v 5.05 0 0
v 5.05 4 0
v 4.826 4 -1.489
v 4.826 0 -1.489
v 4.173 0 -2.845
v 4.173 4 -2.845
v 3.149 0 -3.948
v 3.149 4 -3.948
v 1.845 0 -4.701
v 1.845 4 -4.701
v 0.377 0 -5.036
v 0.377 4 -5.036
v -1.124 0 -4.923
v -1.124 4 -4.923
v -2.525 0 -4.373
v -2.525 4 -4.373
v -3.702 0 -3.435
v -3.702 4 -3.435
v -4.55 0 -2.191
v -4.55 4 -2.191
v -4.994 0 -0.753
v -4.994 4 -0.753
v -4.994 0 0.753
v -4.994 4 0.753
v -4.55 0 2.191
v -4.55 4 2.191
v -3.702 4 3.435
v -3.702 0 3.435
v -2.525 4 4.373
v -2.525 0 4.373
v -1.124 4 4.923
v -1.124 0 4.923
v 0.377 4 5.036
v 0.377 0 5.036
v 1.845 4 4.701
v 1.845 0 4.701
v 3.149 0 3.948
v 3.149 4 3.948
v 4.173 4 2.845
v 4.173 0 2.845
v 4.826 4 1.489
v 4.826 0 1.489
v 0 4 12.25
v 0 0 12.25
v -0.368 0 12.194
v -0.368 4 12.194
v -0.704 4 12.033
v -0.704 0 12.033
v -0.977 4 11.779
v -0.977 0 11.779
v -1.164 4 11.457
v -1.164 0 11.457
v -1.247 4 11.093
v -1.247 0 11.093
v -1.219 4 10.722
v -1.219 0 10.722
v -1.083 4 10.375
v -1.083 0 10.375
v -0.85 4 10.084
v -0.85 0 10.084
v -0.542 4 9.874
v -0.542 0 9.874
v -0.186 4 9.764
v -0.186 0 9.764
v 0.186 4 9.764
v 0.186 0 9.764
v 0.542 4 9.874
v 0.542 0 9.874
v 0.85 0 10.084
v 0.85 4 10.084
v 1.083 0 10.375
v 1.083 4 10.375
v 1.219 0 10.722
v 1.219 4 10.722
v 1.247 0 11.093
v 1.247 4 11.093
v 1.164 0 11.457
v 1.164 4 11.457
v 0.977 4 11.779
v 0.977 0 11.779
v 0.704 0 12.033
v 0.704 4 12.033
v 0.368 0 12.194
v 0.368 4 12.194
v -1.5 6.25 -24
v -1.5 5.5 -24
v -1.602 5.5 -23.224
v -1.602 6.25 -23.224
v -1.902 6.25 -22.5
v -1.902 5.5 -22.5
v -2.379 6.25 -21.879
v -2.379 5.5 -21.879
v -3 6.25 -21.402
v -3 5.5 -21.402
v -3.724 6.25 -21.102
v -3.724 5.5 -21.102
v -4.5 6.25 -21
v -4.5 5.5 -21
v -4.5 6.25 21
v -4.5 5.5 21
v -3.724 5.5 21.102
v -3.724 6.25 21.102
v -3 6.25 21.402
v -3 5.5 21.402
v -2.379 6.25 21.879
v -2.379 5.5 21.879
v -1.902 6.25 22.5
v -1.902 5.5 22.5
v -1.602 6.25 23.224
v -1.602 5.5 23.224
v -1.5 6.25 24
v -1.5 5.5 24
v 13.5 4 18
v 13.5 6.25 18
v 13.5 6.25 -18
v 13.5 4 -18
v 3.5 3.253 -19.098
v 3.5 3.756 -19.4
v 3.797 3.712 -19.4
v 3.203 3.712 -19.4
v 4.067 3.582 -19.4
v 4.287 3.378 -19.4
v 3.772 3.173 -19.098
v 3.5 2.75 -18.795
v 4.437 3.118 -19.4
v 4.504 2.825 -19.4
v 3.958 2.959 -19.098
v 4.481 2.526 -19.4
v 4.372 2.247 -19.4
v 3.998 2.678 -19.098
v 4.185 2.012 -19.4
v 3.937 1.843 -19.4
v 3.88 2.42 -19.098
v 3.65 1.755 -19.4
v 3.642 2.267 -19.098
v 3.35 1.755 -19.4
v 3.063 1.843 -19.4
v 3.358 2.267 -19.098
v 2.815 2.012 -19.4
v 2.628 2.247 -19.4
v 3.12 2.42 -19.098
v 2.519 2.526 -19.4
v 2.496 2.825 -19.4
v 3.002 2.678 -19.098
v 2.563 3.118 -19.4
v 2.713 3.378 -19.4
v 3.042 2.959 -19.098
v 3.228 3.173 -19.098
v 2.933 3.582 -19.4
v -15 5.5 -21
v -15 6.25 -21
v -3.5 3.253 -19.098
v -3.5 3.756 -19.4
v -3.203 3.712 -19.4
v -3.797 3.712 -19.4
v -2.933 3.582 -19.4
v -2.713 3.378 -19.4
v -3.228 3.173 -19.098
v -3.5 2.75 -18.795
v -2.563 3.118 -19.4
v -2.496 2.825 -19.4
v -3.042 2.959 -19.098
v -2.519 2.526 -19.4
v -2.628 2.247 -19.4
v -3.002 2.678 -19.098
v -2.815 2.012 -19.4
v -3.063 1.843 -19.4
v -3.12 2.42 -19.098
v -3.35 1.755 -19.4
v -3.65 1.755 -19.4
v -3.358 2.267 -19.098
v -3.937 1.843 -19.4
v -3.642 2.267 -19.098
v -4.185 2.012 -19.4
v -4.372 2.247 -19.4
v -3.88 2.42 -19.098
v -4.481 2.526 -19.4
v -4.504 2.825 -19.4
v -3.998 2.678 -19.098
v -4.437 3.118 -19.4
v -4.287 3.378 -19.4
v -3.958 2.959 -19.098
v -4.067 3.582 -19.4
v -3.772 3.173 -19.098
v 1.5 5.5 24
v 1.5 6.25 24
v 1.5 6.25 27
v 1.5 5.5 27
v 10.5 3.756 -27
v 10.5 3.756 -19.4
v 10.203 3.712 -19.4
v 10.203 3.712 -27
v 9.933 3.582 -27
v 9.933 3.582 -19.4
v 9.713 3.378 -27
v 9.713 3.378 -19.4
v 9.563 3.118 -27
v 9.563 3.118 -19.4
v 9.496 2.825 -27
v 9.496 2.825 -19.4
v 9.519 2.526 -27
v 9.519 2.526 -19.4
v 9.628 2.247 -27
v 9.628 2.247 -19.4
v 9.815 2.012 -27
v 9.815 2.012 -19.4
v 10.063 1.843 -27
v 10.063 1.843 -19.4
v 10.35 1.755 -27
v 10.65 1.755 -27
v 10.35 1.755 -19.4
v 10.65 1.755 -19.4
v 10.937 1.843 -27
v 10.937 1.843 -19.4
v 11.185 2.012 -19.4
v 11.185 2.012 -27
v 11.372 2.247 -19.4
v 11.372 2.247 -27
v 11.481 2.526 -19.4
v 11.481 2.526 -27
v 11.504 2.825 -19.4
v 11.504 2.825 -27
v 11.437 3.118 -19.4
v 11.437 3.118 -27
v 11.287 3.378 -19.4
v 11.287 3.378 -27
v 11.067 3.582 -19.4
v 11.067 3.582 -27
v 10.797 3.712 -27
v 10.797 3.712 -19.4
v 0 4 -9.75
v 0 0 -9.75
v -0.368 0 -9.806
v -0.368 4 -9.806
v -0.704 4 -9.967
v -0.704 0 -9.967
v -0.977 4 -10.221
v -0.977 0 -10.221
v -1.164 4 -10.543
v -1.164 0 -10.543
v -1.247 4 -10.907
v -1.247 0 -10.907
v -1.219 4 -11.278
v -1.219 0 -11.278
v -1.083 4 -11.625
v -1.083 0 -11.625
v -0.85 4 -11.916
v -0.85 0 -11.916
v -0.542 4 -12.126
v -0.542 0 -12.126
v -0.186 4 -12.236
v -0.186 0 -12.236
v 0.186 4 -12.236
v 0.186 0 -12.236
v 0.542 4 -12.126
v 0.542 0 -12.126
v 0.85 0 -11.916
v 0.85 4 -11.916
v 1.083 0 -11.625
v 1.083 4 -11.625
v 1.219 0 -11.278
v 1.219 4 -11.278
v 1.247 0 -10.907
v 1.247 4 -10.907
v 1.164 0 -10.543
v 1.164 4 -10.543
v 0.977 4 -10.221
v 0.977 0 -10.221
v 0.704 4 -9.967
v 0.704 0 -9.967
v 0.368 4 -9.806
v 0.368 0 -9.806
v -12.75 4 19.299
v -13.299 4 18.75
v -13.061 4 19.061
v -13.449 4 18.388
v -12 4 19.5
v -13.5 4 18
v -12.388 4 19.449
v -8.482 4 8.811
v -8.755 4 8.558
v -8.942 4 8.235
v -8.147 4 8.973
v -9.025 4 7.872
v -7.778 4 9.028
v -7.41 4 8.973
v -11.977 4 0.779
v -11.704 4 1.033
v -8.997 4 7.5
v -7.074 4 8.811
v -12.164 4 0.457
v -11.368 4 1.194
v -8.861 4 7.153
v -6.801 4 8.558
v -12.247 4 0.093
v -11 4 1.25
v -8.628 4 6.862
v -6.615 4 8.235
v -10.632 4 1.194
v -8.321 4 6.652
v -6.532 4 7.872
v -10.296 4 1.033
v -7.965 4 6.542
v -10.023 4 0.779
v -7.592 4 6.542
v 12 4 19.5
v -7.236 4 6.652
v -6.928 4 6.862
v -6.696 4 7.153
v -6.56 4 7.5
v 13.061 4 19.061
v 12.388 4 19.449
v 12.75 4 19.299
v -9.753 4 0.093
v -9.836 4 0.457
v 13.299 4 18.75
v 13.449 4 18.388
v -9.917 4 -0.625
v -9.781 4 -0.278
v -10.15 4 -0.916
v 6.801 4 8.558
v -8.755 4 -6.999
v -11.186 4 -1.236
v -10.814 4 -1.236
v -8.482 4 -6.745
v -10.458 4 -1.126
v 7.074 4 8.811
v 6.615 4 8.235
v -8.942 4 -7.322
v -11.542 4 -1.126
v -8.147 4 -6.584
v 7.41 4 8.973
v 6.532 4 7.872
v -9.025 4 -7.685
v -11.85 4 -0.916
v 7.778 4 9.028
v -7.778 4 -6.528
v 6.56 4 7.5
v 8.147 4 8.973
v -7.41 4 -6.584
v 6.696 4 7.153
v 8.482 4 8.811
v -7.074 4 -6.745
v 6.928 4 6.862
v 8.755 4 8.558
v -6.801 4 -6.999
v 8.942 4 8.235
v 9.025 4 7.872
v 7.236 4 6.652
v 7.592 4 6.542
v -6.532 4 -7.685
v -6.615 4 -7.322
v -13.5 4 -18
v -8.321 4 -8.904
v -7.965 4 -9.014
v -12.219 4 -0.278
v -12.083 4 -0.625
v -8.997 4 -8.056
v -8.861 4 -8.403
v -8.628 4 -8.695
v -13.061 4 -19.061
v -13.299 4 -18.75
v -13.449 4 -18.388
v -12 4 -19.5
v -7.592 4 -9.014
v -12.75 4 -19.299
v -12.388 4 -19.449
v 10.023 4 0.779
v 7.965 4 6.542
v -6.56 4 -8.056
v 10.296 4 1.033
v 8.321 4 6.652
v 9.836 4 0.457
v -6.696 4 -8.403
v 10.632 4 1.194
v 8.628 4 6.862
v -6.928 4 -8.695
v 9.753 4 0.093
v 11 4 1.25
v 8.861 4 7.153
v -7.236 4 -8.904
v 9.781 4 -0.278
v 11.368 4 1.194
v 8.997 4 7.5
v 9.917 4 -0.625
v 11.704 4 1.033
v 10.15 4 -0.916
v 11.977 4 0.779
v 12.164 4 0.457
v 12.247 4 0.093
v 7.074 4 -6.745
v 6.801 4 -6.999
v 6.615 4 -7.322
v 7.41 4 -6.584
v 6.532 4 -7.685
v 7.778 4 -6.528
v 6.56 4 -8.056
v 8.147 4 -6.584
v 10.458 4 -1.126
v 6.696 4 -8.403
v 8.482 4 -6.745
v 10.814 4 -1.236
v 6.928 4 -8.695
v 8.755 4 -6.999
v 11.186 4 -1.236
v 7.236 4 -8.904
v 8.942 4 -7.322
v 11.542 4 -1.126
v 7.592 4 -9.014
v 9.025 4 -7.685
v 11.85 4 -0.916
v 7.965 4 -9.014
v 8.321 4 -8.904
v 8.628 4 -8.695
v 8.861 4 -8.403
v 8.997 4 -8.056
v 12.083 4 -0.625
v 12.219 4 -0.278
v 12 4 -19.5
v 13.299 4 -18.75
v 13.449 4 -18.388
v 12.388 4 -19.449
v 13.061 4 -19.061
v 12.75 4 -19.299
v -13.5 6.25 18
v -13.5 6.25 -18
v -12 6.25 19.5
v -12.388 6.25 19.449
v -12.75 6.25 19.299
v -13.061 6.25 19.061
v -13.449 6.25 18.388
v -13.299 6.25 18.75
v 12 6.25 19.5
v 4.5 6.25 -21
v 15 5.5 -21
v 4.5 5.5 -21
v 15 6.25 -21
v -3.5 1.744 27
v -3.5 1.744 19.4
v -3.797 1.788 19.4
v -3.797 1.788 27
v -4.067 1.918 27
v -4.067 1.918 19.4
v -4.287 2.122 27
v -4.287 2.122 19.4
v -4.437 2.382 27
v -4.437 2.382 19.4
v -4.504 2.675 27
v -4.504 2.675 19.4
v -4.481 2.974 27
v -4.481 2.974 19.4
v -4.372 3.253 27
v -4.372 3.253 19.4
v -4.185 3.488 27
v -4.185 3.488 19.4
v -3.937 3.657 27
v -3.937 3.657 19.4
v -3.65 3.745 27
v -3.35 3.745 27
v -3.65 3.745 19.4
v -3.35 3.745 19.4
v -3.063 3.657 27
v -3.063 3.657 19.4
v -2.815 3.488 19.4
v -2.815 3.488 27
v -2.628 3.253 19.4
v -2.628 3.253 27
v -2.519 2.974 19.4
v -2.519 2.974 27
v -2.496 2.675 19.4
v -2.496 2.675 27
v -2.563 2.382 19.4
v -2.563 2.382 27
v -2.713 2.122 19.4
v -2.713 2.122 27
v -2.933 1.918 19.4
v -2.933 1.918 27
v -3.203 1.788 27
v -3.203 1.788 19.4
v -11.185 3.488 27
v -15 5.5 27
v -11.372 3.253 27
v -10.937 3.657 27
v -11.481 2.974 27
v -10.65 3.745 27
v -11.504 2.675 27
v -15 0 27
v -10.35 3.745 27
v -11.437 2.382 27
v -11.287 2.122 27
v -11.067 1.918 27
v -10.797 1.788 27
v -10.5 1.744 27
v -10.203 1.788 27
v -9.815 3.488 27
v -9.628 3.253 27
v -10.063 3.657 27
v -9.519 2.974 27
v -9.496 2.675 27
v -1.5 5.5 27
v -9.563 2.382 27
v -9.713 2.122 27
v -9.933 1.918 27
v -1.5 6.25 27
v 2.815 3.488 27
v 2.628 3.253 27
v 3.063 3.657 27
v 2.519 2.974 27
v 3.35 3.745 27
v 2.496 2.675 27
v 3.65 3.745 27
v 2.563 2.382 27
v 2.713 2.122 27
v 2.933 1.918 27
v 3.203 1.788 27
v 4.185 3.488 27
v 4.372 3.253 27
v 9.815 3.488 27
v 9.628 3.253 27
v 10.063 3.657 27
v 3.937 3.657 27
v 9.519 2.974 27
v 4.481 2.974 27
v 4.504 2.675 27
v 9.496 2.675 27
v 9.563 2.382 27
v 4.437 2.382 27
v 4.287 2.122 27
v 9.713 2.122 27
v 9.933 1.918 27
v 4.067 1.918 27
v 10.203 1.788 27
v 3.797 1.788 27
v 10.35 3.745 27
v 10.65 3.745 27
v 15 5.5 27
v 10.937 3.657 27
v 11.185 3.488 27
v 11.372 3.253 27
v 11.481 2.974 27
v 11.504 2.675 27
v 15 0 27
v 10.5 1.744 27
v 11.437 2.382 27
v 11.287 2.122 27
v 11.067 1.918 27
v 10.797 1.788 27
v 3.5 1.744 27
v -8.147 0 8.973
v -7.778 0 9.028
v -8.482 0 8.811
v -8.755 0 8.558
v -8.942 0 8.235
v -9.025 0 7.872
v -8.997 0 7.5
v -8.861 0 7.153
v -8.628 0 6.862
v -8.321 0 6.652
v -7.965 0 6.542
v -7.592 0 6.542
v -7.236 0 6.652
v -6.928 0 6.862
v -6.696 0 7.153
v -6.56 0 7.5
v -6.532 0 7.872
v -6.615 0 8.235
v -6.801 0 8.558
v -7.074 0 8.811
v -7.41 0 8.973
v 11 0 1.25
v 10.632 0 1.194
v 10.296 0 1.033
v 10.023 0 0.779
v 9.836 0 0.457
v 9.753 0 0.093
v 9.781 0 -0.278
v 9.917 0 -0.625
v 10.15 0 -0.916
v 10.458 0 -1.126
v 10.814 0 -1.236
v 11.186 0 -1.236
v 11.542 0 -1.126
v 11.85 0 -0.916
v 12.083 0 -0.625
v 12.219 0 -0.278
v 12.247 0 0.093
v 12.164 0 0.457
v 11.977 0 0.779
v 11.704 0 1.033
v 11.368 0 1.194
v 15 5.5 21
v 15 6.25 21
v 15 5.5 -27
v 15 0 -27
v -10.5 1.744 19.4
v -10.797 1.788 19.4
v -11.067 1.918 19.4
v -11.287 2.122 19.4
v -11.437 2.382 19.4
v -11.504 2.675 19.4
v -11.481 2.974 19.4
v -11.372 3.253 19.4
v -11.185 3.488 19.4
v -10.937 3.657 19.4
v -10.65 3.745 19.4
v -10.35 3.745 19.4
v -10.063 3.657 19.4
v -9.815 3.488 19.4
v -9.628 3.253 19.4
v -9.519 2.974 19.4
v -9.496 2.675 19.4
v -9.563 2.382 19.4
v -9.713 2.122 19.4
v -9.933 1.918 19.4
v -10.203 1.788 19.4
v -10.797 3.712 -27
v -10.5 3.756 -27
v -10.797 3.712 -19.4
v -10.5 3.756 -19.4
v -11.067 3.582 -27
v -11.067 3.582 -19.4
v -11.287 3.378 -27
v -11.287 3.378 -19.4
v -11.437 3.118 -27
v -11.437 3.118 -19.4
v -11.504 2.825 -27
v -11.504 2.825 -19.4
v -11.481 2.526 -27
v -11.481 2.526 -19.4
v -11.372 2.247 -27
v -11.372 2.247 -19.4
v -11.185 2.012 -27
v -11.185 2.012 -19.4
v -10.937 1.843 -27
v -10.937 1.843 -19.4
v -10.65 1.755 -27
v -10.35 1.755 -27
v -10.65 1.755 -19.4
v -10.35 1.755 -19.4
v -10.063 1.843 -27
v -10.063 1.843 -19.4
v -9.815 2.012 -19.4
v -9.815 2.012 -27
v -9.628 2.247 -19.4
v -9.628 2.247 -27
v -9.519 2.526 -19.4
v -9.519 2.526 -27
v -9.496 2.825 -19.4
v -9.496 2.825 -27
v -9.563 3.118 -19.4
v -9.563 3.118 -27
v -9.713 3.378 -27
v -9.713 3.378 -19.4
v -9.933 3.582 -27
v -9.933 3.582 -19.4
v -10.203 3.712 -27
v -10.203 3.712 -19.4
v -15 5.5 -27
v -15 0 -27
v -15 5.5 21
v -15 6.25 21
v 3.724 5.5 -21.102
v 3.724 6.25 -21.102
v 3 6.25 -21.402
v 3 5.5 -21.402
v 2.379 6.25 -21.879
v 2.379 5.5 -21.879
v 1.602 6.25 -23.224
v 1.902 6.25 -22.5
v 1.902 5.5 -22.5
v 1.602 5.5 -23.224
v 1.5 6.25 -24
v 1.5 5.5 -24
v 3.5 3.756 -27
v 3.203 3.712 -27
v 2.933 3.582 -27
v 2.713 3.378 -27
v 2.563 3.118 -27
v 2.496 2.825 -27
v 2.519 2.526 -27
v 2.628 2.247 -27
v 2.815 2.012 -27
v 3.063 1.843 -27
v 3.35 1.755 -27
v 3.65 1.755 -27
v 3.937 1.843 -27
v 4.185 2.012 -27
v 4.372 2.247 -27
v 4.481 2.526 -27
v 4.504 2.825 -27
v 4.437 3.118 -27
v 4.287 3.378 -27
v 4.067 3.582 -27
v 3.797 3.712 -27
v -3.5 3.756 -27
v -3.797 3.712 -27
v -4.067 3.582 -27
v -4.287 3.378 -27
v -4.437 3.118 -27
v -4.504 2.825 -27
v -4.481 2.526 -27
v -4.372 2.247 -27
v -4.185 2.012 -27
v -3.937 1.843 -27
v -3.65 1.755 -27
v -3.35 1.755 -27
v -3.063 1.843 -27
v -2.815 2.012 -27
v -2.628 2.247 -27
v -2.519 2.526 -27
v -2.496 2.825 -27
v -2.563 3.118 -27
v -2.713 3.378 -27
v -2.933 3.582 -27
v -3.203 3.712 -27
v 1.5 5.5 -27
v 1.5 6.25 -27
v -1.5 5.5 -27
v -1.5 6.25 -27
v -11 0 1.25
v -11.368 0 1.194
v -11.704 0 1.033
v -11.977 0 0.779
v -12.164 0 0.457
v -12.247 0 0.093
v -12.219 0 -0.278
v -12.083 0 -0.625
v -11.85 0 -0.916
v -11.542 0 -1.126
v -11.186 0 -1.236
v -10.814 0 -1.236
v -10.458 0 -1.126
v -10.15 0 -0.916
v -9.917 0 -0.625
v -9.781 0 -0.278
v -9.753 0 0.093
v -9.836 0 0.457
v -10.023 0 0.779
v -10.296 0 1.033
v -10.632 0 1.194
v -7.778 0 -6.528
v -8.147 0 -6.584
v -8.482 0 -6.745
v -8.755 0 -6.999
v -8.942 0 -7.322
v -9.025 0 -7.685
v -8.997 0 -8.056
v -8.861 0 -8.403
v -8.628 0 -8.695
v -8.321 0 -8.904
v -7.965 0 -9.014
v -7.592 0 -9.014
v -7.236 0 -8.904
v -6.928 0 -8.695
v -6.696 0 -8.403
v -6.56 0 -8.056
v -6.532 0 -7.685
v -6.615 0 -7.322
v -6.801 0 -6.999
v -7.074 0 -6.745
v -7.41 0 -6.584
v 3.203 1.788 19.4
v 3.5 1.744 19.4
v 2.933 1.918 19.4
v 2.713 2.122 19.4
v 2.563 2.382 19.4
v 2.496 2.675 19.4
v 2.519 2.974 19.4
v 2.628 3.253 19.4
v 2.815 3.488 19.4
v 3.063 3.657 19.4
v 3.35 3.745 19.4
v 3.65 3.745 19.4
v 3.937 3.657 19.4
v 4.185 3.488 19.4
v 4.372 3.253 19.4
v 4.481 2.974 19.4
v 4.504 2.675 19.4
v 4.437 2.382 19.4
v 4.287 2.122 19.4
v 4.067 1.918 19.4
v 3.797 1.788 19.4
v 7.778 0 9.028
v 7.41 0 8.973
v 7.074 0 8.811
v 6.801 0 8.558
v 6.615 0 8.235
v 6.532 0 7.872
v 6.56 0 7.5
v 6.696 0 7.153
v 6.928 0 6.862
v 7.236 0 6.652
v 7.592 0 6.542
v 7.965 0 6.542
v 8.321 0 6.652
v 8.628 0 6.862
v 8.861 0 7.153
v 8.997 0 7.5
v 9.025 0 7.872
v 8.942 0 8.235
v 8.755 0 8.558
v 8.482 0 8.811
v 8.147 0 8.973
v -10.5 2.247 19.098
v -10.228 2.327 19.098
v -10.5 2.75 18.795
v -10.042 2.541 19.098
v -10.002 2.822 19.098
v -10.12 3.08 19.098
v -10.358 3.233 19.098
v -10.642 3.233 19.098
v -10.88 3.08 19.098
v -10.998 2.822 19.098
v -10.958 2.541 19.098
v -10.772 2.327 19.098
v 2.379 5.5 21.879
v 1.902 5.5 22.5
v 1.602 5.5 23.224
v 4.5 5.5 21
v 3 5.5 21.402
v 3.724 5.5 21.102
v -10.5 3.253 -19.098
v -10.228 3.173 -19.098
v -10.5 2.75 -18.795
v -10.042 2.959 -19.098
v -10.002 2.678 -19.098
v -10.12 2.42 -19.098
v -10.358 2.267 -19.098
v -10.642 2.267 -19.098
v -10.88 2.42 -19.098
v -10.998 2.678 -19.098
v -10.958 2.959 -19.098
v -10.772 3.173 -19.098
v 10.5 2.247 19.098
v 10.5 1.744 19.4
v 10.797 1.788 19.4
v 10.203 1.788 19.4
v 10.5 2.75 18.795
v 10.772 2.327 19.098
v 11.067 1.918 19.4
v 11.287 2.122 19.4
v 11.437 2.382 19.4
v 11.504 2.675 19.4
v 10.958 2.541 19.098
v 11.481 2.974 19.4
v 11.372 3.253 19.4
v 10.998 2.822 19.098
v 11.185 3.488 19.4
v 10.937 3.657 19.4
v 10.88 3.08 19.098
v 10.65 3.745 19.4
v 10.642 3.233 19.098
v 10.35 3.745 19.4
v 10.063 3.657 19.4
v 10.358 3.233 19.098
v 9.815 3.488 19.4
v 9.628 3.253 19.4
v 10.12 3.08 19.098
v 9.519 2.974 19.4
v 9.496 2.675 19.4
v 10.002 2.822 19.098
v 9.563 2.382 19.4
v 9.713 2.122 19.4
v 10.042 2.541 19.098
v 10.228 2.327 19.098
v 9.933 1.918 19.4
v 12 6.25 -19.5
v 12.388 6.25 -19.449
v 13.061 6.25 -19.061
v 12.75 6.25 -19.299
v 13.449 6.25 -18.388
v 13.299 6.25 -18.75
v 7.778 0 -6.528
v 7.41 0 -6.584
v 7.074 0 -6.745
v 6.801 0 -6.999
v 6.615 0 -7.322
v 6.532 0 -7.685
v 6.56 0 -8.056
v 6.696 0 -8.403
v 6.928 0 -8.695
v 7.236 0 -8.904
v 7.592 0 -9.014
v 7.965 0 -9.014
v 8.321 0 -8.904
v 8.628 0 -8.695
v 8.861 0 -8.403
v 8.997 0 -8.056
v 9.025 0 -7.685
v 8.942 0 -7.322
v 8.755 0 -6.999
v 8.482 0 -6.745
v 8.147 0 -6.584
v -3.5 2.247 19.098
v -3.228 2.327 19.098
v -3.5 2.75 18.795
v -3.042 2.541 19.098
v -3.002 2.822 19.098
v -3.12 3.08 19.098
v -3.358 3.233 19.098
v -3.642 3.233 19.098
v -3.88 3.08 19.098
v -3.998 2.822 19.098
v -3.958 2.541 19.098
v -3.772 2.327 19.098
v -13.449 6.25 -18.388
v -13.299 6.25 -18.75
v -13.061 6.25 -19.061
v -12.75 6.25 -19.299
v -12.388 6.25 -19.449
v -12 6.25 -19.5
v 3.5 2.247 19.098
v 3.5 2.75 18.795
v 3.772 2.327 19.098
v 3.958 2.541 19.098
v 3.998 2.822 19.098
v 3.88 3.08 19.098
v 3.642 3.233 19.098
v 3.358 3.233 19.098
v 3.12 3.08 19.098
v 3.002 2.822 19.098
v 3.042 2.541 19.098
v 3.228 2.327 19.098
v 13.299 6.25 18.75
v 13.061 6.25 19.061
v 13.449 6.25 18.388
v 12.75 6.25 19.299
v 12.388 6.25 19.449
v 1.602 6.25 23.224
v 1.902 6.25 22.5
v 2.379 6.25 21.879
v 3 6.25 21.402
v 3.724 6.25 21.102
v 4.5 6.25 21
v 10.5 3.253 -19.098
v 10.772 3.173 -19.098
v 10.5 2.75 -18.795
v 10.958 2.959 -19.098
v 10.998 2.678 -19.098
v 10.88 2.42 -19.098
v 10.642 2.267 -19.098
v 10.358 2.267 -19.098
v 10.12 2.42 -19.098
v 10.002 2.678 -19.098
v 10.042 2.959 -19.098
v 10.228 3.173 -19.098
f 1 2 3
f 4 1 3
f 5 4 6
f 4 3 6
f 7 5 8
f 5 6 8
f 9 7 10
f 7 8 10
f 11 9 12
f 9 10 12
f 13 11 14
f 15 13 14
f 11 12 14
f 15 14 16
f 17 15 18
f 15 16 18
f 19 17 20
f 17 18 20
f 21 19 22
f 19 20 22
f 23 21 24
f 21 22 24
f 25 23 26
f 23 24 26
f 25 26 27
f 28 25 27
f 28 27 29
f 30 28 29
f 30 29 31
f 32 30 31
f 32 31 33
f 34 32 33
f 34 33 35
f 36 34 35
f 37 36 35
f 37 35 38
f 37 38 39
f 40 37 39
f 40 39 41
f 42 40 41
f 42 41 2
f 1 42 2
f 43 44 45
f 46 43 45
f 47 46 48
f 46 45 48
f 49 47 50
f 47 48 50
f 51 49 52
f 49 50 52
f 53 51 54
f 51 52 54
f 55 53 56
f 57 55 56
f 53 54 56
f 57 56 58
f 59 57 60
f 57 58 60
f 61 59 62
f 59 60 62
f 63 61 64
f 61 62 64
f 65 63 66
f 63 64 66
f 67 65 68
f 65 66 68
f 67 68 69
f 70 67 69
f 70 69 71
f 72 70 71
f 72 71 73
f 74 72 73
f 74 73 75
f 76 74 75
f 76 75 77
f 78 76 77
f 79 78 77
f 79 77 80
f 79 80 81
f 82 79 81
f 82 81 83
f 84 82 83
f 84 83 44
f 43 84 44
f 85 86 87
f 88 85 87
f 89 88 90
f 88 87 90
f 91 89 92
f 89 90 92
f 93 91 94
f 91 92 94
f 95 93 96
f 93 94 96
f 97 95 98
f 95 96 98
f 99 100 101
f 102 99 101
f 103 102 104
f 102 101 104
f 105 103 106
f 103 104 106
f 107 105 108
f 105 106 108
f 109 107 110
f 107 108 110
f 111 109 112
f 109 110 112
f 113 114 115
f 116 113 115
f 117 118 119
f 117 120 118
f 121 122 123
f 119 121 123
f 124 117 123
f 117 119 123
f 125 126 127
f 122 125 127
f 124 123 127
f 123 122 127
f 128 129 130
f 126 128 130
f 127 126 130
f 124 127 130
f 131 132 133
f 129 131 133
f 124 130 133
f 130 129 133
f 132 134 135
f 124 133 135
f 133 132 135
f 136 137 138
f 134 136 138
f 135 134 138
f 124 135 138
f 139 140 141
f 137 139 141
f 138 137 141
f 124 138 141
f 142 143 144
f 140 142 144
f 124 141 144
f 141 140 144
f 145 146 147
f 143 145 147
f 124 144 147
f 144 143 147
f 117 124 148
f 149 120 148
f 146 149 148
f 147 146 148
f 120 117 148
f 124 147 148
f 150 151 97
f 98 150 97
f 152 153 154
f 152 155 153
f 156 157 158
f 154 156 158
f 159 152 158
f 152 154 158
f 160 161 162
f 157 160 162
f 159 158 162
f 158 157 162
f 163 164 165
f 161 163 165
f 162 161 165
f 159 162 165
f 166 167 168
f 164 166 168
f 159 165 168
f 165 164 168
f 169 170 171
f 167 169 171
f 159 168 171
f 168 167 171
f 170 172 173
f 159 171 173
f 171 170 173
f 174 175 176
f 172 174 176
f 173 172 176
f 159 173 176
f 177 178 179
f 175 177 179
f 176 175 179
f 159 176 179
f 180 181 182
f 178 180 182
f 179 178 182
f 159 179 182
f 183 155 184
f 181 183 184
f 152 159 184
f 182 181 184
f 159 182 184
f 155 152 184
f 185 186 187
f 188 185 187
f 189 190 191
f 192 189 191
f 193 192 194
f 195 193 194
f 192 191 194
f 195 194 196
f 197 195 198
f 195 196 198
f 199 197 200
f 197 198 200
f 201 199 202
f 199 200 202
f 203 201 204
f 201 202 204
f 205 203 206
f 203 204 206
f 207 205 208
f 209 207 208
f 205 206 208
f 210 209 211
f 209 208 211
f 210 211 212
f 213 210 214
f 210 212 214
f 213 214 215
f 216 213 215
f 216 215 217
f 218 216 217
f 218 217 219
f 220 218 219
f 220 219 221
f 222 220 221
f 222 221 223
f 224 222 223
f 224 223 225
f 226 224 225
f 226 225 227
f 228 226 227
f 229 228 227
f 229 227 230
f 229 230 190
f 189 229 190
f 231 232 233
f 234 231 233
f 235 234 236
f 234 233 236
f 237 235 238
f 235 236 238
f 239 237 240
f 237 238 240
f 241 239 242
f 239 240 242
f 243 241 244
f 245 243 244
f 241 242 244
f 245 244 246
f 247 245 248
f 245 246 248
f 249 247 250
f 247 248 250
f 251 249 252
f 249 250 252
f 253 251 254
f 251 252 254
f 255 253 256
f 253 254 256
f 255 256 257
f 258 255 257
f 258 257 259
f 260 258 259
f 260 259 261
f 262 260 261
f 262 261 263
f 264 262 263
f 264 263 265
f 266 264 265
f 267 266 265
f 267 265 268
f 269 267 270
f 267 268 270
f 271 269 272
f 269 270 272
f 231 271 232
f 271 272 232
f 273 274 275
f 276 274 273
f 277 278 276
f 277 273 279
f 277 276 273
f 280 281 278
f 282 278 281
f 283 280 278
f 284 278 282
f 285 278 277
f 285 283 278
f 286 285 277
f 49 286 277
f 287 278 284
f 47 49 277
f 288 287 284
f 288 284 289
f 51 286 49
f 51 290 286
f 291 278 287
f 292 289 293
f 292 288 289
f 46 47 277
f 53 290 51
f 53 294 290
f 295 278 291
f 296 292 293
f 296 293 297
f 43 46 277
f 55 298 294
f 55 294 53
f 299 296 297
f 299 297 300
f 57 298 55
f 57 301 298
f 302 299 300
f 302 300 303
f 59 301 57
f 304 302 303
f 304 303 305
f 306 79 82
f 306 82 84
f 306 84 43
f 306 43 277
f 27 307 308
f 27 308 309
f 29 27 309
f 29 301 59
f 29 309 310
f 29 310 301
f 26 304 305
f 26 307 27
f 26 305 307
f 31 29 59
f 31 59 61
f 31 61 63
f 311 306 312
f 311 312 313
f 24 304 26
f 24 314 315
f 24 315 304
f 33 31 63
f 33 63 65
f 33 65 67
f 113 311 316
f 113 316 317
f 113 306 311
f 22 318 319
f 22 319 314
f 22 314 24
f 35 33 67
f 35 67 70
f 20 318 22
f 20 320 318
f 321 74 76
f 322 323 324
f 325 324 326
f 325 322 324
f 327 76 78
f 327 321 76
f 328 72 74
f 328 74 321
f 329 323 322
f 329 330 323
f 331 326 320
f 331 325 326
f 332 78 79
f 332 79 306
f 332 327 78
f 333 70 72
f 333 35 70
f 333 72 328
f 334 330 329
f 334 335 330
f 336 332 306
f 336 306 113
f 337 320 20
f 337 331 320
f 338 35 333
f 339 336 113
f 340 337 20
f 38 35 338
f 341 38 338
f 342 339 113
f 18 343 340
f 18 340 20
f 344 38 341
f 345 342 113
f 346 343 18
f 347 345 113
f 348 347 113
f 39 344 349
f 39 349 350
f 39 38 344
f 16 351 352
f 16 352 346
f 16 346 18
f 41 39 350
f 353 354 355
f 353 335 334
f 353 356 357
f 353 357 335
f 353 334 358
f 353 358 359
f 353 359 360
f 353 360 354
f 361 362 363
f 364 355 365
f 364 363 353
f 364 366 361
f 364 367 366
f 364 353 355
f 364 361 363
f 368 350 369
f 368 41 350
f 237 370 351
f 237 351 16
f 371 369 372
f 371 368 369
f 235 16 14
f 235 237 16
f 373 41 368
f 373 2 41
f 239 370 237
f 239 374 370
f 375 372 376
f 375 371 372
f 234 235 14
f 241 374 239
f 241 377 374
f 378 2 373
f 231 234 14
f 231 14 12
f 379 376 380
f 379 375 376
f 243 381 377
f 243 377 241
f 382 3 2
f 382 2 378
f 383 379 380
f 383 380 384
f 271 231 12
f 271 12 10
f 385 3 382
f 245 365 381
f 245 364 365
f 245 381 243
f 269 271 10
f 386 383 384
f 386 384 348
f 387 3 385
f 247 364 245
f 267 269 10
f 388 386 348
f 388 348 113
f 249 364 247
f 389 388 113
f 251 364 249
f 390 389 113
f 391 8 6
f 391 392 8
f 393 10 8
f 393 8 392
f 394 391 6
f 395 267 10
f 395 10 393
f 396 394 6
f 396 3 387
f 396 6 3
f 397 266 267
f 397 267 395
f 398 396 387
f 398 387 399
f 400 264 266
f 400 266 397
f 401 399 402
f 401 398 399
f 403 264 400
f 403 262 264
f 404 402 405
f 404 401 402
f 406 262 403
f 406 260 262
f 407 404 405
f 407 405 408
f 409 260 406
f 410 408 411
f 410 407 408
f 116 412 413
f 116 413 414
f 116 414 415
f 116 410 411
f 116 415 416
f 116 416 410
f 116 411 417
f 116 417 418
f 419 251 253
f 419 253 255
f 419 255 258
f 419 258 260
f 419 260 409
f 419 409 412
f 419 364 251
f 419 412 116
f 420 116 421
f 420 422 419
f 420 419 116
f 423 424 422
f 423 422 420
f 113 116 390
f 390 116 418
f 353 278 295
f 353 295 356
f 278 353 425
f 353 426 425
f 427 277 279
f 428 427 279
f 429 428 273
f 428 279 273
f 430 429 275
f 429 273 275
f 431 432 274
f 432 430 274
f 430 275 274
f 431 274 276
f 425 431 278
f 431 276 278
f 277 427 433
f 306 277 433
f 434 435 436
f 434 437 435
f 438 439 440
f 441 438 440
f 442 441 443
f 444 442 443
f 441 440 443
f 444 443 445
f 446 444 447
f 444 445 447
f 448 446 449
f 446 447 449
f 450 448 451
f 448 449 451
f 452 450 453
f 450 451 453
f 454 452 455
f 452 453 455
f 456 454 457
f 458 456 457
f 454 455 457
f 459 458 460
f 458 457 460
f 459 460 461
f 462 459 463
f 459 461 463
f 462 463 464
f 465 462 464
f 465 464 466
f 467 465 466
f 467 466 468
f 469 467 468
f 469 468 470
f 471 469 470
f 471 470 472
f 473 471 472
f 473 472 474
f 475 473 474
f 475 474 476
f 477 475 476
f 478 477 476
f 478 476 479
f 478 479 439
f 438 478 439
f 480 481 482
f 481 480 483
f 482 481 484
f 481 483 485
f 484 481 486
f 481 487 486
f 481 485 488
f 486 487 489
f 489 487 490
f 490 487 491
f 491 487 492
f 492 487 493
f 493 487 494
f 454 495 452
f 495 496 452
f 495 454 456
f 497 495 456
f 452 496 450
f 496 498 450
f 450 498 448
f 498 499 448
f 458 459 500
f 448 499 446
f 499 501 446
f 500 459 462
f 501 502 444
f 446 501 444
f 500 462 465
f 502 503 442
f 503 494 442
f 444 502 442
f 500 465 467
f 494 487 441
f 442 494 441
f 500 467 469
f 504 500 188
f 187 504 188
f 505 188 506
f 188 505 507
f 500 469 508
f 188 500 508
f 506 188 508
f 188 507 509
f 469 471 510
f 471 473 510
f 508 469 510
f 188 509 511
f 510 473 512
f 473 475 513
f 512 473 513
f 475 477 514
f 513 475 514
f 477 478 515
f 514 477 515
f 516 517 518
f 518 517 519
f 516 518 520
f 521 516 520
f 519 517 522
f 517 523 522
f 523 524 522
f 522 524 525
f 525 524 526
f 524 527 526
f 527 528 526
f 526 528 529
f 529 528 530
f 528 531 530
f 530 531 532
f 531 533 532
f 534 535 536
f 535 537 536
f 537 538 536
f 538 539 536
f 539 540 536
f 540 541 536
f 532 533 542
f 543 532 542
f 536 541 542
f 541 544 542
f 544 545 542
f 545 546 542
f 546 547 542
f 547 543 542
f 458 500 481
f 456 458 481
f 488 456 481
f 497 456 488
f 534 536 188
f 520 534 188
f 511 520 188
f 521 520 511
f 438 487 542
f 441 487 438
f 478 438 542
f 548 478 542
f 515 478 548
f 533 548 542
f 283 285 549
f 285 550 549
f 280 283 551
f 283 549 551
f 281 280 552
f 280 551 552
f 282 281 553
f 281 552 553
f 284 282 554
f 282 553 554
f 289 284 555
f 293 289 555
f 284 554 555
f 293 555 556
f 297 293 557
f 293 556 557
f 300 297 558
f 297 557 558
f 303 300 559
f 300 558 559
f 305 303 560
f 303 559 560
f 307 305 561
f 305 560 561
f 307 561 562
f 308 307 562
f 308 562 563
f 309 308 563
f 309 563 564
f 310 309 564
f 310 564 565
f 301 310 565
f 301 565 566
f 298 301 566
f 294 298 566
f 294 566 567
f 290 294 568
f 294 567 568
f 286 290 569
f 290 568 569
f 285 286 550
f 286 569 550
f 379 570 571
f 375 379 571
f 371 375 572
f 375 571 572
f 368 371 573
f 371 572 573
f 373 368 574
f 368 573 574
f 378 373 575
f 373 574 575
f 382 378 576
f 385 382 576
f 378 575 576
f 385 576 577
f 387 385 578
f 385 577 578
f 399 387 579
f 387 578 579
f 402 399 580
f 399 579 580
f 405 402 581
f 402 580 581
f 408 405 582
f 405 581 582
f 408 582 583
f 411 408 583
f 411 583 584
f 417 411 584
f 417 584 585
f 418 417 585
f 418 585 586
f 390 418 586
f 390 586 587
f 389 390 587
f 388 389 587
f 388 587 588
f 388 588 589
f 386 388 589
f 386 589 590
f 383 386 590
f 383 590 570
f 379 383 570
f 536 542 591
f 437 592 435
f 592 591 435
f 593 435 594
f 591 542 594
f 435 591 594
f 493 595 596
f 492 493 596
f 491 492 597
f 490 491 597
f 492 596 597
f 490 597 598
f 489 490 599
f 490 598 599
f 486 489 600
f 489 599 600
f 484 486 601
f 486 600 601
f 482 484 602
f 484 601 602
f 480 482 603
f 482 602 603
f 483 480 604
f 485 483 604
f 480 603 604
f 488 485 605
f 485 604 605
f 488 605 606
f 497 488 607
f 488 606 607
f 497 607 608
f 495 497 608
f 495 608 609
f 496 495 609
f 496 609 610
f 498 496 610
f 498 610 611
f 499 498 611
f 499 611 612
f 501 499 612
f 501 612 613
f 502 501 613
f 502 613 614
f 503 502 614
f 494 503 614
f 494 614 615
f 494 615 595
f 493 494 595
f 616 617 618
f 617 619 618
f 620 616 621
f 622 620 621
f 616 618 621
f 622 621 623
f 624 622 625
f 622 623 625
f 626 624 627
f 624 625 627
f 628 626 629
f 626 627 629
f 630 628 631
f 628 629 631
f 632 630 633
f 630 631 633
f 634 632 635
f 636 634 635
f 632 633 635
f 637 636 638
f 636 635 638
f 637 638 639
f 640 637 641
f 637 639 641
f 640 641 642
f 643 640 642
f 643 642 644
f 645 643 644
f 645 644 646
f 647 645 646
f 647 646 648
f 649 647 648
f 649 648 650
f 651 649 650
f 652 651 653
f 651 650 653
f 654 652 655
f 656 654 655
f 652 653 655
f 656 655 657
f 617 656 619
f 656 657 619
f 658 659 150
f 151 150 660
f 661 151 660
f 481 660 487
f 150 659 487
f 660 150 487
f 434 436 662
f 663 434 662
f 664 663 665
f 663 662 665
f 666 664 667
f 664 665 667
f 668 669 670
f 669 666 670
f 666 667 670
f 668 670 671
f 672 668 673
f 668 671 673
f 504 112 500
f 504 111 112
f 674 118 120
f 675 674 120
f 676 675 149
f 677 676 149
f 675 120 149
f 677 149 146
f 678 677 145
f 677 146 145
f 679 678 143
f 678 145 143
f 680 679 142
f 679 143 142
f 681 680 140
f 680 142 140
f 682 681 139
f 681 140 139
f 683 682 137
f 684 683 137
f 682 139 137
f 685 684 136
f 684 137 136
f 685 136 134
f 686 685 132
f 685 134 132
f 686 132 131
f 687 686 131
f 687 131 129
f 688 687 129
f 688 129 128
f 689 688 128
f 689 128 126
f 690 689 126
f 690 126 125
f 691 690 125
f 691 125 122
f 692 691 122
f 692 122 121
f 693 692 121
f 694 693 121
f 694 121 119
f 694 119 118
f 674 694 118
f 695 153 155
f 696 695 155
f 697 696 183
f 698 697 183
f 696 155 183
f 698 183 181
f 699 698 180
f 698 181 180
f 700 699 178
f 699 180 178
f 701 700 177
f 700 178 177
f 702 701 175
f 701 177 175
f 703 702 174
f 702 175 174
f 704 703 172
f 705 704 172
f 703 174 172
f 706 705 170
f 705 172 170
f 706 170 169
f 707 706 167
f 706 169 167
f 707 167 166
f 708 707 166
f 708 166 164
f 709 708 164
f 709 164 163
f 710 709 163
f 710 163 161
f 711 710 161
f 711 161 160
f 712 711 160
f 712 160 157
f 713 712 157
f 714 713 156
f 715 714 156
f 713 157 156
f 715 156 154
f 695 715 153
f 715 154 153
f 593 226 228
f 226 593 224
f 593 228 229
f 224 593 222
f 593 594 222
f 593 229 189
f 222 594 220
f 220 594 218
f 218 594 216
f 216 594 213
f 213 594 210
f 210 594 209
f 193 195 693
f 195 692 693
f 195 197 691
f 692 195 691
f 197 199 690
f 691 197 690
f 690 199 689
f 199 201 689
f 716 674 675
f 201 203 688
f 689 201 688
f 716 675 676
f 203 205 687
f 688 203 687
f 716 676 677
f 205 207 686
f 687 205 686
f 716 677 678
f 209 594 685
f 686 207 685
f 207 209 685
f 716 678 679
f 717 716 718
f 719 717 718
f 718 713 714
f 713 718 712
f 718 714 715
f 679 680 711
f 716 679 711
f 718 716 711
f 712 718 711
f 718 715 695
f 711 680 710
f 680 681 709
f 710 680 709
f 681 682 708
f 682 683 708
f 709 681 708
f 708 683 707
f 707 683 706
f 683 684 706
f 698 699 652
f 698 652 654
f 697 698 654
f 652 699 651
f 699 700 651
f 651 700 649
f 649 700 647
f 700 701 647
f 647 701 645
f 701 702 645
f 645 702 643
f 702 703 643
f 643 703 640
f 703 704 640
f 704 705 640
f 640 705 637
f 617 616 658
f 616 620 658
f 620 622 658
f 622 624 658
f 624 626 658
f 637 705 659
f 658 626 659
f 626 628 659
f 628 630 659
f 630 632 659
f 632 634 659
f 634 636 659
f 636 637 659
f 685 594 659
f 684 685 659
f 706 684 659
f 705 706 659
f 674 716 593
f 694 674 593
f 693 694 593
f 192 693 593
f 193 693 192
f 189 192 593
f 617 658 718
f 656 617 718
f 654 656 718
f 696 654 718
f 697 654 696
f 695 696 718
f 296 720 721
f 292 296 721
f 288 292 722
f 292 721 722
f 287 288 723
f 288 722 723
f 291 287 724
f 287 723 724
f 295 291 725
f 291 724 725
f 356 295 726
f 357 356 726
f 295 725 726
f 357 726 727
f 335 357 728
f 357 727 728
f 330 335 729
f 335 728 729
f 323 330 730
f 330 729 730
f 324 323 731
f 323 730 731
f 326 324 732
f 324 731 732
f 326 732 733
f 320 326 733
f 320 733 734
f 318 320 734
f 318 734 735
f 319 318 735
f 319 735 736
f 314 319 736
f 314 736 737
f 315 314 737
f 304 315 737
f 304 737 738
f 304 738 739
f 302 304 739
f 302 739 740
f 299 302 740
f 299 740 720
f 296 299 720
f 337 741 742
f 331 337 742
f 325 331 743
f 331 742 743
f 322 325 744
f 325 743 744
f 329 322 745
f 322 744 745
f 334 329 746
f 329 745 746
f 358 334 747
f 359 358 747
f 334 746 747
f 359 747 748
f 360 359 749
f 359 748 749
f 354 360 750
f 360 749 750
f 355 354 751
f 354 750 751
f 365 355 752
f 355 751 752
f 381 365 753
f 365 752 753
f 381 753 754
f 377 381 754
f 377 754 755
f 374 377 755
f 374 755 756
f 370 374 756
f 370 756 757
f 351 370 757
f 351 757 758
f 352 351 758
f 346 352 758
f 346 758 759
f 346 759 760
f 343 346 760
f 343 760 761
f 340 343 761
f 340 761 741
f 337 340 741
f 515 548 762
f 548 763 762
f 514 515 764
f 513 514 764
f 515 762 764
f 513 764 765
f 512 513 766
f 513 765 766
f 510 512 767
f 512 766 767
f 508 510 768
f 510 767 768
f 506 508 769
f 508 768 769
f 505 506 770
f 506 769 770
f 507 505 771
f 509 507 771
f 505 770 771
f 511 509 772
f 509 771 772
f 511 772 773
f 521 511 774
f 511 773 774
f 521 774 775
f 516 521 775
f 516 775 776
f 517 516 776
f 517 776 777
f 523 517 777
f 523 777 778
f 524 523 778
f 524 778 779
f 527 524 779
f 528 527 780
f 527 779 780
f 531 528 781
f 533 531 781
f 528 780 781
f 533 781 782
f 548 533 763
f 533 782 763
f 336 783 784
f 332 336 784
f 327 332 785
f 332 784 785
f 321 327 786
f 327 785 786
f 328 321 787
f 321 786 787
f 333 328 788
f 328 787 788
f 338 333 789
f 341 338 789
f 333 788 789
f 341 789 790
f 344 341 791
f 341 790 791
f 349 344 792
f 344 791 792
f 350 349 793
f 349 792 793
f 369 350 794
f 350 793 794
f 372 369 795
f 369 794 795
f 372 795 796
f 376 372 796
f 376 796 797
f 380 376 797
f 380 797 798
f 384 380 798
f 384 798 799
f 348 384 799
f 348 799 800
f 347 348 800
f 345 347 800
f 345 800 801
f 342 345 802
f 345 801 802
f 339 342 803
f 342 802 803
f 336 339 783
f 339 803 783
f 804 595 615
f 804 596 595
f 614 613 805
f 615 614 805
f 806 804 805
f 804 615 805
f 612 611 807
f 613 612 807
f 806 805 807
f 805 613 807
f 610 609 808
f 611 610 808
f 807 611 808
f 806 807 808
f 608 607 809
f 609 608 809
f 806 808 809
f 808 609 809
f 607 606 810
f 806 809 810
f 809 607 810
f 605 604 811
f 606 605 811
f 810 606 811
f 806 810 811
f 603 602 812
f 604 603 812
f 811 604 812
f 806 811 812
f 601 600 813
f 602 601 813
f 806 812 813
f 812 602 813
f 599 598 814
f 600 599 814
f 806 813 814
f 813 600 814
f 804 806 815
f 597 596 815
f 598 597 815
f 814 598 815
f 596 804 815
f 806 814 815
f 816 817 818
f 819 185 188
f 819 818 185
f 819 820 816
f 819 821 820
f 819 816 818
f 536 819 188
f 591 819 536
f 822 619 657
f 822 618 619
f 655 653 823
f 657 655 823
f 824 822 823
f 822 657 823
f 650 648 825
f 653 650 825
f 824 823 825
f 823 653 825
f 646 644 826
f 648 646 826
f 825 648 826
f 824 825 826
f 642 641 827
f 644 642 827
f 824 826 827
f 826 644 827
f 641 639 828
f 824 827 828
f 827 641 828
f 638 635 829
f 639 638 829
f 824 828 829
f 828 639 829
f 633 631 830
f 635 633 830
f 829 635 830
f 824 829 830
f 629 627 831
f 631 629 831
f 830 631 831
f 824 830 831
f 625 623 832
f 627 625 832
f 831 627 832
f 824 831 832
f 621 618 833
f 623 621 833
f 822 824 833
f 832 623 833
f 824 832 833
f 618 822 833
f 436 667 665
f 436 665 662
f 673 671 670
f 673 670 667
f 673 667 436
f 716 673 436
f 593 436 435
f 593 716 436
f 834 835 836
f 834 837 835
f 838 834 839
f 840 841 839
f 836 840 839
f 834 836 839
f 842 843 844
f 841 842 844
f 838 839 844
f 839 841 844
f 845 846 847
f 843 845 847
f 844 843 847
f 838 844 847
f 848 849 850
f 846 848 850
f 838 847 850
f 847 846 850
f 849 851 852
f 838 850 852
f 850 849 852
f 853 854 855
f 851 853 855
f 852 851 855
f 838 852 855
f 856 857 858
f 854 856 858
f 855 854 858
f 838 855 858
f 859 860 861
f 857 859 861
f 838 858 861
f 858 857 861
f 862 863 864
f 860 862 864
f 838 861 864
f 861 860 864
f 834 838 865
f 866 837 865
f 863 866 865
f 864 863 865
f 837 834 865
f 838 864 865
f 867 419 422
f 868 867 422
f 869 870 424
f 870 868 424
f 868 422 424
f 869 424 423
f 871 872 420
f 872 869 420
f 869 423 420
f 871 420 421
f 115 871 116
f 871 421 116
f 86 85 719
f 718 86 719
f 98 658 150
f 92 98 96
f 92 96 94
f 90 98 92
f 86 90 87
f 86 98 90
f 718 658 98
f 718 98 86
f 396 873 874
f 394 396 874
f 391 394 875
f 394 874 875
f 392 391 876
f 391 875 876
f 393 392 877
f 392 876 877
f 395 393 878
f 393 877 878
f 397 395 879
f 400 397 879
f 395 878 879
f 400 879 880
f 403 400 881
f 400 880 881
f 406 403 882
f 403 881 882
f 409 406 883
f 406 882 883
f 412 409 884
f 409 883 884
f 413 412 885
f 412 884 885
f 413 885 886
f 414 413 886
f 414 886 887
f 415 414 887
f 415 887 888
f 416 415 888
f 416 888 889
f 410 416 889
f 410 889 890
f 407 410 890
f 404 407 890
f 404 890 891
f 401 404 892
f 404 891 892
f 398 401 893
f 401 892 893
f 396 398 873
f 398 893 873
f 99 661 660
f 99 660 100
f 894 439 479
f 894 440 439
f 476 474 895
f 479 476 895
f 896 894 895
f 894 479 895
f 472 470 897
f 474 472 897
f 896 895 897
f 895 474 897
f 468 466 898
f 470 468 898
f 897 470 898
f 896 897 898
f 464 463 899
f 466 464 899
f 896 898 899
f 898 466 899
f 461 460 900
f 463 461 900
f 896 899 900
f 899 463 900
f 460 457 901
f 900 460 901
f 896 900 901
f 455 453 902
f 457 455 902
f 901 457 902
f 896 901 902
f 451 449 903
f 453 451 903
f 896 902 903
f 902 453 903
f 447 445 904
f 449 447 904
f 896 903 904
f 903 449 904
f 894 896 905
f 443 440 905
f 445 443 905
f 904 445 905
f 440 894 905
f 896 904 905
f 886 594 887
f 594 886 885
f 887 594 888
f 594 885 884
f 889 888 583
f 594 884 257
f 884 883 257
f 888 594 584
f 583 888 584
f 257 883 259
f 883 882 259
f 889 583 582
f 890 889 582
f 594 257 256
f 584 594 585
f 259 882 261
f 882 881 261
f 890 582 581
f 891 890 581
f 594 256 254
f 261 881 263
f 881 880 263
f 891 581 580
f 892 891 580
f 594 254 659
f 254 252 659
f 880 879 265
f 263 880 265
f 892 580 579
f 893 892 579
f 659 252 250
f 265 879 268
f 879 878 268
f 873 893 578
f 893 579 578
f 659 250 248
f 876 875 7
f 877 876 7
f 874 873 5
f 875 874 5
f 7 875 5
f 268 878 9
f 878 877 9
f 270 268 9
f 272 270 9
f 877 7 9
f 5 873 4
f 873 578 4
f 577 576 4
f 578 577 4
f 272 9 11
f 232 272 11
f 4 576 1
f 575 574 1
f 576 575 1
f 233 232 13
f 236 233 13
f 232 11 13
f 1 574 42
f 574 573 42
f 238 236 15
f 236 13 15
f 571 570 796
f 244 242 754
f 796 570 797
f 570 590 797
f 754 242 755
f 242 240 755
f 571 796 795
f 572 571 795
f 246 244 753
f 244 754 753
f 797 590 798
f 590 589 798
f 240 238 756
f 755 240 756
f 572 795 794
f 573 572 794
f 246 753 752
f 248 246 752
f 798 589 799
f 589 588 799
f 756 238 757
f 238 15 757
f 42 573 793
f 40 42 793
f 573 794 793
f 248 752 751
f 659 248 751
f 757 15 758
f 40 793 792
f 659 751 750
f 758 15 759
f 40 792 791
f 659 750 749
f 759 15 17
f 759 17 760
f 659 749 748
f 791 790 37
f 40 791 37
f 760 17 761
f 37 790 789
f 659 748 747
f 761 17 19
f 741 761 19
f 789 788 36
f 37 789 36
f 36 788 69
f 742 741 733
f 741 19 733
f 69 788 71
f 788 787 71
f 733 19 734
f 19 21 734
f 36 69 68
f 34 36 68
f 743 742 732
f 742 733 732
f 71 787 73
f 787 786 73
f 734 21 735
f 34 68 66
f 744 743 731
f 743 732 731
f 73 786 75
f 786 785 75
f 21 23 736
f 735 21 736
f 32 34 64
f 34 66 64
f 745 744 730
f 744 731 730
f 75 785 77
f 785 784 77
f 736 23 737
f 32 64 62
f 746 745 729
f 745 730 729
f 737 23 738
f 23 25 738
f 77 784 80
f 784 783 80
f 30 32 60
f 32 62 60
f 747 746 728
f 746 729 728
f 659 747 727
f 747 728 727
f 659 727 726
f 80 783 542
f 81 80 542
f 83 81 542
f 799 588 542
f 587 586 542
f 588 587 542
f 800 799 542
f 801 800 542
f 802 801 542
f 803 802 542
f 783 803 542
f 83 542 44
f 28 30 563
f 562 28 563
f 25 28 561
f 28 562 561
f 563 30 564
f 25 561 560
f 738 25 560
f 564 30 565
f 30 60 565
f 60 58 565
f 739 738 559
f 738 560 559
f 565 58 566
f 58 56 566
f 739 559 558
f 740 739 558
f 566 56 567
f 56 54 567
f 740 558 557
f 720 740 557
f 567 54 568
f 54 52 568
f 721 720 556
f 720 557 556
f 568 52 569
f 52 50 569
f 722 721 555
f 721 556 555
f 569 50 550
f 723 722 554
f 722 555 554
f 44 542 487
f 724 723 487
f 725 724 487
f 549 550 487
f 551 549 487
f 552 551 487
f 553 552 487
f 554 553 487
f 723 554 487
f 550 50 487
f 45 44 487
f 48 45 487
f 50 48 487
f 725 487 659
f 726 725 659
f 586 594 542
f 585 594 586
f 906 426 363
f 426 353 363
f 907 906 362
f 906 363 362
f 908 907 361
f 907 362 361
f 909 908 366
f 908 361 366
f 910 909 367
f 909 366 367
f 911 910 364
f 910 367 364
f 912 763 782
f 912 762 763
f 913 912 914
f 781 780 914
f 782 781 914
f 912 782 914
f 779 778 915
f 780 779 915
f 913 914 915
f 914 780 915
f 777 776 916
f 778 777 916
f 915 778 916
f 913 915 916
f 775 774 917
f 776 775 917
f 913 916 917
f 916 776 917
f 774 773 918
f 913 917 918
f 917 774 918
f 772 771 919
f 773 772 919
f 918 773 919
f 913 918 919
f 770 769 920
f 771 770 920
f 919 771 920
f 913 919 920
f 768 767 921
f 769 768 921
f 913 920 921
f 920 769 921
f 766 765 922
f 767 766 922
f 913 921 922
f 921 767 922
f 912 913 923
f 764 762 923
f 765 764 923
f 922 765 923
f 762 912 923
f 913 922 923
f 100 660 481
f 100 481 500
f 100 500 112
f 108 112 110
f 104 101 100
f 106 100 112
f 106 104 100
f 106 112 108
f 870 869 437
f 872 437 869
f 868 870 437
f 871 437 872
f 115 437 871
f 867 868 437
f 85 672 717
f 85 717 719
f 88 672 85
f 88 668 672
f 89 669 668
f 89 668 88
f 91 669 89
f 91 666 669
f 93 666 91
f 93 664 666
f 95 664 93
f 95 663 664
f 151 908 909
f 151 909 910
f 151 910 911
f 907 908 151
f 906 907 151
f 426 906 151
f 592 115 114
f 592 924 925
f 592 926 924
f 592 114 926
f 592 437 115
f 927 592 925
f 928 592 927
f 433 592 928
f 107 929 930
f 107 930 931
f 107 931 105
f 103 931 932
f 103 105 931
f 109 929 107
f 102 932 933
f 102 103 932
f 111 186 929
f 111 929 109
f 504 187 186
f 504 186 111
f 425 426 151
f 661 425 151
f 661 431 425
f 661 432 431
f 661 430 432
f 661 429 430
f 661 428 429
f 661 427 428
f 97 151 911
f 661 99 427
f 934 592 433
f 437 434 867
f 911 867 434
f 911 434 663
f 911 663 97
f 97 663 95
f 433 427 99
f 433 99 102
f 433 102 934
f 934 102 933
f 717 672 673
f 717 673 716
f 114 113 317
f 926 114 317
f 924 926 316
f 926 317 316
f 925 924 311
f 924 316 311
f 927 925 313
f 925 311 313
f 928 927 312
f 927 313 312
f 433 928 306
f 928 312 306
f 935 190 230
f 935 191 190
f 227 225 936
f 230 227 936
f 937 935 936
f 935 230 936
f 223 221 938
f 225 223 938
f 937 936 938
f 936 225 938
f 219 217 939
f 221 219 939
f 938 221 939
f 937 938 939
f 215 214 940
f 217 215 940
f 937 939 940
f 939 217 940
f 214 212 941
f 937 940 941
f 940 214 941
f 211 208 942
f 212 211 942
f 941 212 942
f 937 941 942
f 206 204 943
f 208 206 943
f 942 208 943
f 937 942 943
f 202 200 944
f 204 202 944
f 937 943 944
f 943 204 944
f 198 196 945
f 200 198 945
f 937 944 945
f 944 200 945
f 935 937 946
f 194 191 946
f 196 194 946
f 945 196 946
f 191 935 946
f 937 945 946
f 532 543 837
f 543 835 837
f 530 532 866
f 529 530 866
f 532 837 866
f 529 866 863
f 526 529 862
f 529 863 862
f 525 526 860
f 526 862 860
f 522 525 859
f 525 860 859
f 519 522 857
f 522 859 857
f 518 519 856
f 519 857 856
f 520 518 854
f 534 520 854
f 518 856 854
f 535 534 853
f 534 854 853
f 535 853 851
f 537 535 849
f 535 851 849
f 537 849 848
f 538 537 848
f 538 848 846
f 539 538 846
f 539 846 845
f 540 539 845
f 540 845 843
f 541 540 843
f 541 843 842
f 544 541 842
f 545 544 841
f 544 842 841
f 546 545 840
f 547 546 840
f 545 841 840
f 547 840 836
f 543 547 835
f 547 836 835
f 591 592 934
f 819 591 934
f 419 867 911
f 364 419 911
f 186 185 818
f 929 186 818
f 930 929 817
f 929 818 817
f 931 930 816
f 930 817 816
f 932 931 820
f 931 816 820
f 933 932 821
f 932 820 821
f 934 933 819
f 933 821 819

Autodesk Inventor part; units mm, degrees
ref_plane "YZ Plane" through (0, 0, 0) normal (1, 0, 0) x (0, 1, 0)
ref_plane "XZ Plane" through (0, 0, 0) normal (0, 1, 0) x (-1, 0, 0)
ref_plane "XY Plane" through (0, 0, 0) normal (0, 0, 1) x (1, 0, 0)
sketch "Sketch1" plane through (0, 0, 0) normal (0, 1, 0) x (-1, 0, 0)
  line L0 (15, 27) -> (-15, 27)
  line L1 (-15, 27) -> (-15, -27)
  line L2 (-15, -27) -> (15, -27)
  line L3 (15, -27) -> (15, 27)
  line L4 (0, 27) -> (0, -27) construction
  line L5 (15, 0) -> (-15, 0) construction
  point P0 (0, 0)
  point P1 (0, 0)
  point P2 (15, 0)
  dimension "d0" = 54
  dimension "d1" = 30
extrude "Extrusion1" add sketch "Sketch1" along normal blind 6.25
sketch "Sketch2" plane through (0, 6.25, 0) normal (0, 1, 0) x (1, 0, 0)
  circle A0 centre (0, 0) radius 11 construction
  line L0 (0, 0) -> (-15, 0) construction
  line L1 (-35.2782, 0) -> (23.3797, 0) construction
  line L2 (0, 37.8) -> (0, -37.8) construction
  line L3 (-15, -27) -> (15, -27) projected
  line L4 (15, -27) -> (15, 27) projected
  line L5 (15, 27) -> (-15, 27) projected
  line L6 (-15, 27) -> (-15, -27) projected
  line L7 (-15, 27) -> (-15, -27) projected
  point P0 (-11, 0)
  point P1 (-7.7782, -7.7782)
  point P2 (0, -11)
  point P3 (7.7782, -7.7782)
  point P4 (11, 0)
  point P5 (7.7782, 7.7782)
  point P6 (0, 11)
  point P7 (-7.7782, 7.7782)
  dimension "d7" = 22
  dimension "d8" = 360
hole "Hole1" at (-11, 6.25, 0) at (-7.7782, 6.25, -7.7782) at (0, 6.25, -11) at (7.7782, 6.25, -7.7782) at (11, 6.25, 0) at (7.7782, 6.25, 7.7782) at (0, 6.25, 11) at (-7.7782, 6.25, 7.7782) direction (0, -1, 0) diameter 2.5 end through all
sketch "Sketch3" plane through (0, 6.25, 0) normal (0, 1, 0) x (1, 0, 0)
  circle A0 centre (0, 0) radius 5.05
  dimension "d17" = 10.1
extrude "Extrusion2" cut sketch "Sketch3" against normal through all
sketch "Sketch6" plane through (-15, 0, 27) normal (0, 0, 1) x (1, 0, 0)
  line L0 (-10.3797, 2.75) -> (37.9037, 2.75) construction
  line L1 (0, 0) -> (30, 0) construction
  line L2 (0, 0) -> (0, 6.25) projected
  point P0 (15, 0)
  point P1 (4.5, 2.75)
  point P2 (11.5, 2.75)
  point P3 (18.5, 2.75)
  point P4 (25.5, 2.75)
  dimension "d33" = 2.75
  dimension "d34" = 4.5
  dimension "d37" = 7
hole "Hole3" at (-10.5, 2.75, 27) at (-3.5, 2.75, 27) at (3.5, 2.75, 27) at (10.5, 2.75, 27) direction (0, 0, -1) diameter 2.013 depth 7.6 tip angle 118 thread size "M2.5x0.45" class "6H" standard "ANSI Metric M Profile"
sketch "Sketch7" plane through (15, 0, -27) normal (0, 0, -1) x (-1, 0, 0)
  line L0 (-10.51, 2.75) -> (37.7733, 2.75) construction
  line L1 (0, 0) -> (29.8697, 0) construction
  line L2 (0, 0) -> (0, 3.7534)
  line L3 (0, 0) -> (30, 0) projected
  line L4 (0, 0) -> (0, 6.25) projected
  point P0 (15, 0)
  point P1 (15, 0)
  point P2 (4.5, 2.75)
  point P3 (11.5, 2.75)
  point P4 (18.5, 2.75)
  point P5 (25.5, 2.75)
  dimension "d53" = 2.75
  dimension "d54" = 4.5
  dimension "d55" = 7
hole "Hole4" at (10.5, 2.75, -27) at (-10.5, 2.75, -27) at (-3.5, 2.75, -27) at (3.5, 2.75, -27) direction (0, 0, 1) diameter 2.013 depth 7.6 tip angle 118 thread size "M2.5x0.45" class "6H" standard "ANSI Metric M Profile"
sketch "Sketch8" plane through (0, 6.25, 0) normal (0, 1, 0) x (1, 0, 0)
  line L0 (0, 38.85) -> (0, -39.55) construction
  line L1 (-15, -27) -> (15, -27) projected
  line L2 (15, 27) -> (-15, 27) projected
  line L3 (-1.5, -27) -> (-15, -27)
  line L4 (-15, -27) -> (-15, -21)
  line L5 (-15, -21) -> (-1.5, -21)
  line L6 (1.5, -27) -> (15, -27)
  line L7 (15, -27) -> (15, -21)
  line L8 (15, -21) -> (1.5, -21)
  line L9 (15, -27) -> (15, 27) projected
  line L10 (-15, 27) -> (-15, -27) projected
  line L11 (-1.5, -21) -> (-1.5, -27)
  line L12 (-15, -27) -> (15, -27) projected
  line L13 (1.5, -21) -> (1.5, -27)
  line L14 (-15, 0) -> (15, 0) construction
  line L15 (-1.5, 27) -> (-15, 27)
  line L16 (-15, 27) -> (-15, 21)
  line L17 (-15, 21) -> (-1.5, 21)
  line L18 (1.5, 27) -> (15, 27)
  line L19 (15, 27) -> (15, 21)
  line L20 (15, 21) -> (1.5, 21)
  line L21 (-1.5, 21) -> (-1.5, 27)
  line L22 (1.5, 21) -> (1.5, 27)
  line L23 (-21.8515, -25) -> (23.2072, -25) construction
  point P0 (0, 0)
  dimension "d80" = 6
  dimension "d81" = 3
  dimension "d82" = 13.5
  dimension "d86" = 2
extrude "Extrusion6" cut sketch "Sketch8" against normal blind 0.75 contours L4 L5 L11 L1 | L13 L8 L7 L1 | L10 L2 L21 L17 | L20 L22 L2 L9
fillet "Fillet1" radius 3 4 edges at (1.5, 5.875, 21) (-1.5, 5.875, 21) (1.5, 5.875, -21) (-1.5, 5.875, -21)
sketch "Sketch11" plane through (0, 6.25, 0) normal (0, 1, 0) x (1, 0, 0)
  line L0 (-13.5, -19.5) -> (13.5, -19.5)
  line L1 (13.5, -19.5) -> (13.5, 19.5)
  line L2 (13.5, 19.5) -> (-13.5, 19.5)
  line L3 (-13.5, 19.5) -> (-13.5, -19.5)
  line L4 (-15, 21) -> (-15, -21) projected
  line L5 (15, -21) -> (15, 21) projected
  line L6 (-1.5, -27) -> (-15, -27) projected
  line L7 (-15, 27) -> (-1.5, 27) projected
  point P0 (0, 0)
  dimension "d87" = 7.5
  dimension "d88" = 7.5
  dimension "d91" = 1.5
  dimension "d92" = 1.5
extrude "Extrusion7" cut sketch "Sketch11" against normal blind 2.25
fillet "Fillet2" radius 1.5 4 edges at (-13.5, 5.125, 19.5) (13.5, 5.125, 19.5) (13.5, 5.125, -19.5) (-13.5, 5.125, -19.5)
equation "\"d0\" = u_internal_width + 2 * u_side_trace_depth"
equation "\"d1\" = u_internal_depth"
equation "\"d3\" = plate_thickness"
equation "\"d7\" = d9"
equation "\"d18\" = plate_thickness"
equation "\"d33\" = hole_2_bottom"
equation "\"d53\" = hole_2_bottom"
equation "\"d83\" = plate_thickness - border_thickness"
equation "\"plate_thickness\" = 6.25"
equation "\"d9\" = 22"
equation "\"tol\" = 0.1"
equation "\"u_internal_width\" = 52"
equation "\"u_internal_depth\" = 30"
equation "\"u_side_trace_depth\" = 1"
equation "\"border_thickness\" = 5.5"
equation "\"hole_2_bottom\" = 0.5 * border_thickness"
properties part number "new_base_u106_long_newbearing" material "Aluminum 2014-T4"
